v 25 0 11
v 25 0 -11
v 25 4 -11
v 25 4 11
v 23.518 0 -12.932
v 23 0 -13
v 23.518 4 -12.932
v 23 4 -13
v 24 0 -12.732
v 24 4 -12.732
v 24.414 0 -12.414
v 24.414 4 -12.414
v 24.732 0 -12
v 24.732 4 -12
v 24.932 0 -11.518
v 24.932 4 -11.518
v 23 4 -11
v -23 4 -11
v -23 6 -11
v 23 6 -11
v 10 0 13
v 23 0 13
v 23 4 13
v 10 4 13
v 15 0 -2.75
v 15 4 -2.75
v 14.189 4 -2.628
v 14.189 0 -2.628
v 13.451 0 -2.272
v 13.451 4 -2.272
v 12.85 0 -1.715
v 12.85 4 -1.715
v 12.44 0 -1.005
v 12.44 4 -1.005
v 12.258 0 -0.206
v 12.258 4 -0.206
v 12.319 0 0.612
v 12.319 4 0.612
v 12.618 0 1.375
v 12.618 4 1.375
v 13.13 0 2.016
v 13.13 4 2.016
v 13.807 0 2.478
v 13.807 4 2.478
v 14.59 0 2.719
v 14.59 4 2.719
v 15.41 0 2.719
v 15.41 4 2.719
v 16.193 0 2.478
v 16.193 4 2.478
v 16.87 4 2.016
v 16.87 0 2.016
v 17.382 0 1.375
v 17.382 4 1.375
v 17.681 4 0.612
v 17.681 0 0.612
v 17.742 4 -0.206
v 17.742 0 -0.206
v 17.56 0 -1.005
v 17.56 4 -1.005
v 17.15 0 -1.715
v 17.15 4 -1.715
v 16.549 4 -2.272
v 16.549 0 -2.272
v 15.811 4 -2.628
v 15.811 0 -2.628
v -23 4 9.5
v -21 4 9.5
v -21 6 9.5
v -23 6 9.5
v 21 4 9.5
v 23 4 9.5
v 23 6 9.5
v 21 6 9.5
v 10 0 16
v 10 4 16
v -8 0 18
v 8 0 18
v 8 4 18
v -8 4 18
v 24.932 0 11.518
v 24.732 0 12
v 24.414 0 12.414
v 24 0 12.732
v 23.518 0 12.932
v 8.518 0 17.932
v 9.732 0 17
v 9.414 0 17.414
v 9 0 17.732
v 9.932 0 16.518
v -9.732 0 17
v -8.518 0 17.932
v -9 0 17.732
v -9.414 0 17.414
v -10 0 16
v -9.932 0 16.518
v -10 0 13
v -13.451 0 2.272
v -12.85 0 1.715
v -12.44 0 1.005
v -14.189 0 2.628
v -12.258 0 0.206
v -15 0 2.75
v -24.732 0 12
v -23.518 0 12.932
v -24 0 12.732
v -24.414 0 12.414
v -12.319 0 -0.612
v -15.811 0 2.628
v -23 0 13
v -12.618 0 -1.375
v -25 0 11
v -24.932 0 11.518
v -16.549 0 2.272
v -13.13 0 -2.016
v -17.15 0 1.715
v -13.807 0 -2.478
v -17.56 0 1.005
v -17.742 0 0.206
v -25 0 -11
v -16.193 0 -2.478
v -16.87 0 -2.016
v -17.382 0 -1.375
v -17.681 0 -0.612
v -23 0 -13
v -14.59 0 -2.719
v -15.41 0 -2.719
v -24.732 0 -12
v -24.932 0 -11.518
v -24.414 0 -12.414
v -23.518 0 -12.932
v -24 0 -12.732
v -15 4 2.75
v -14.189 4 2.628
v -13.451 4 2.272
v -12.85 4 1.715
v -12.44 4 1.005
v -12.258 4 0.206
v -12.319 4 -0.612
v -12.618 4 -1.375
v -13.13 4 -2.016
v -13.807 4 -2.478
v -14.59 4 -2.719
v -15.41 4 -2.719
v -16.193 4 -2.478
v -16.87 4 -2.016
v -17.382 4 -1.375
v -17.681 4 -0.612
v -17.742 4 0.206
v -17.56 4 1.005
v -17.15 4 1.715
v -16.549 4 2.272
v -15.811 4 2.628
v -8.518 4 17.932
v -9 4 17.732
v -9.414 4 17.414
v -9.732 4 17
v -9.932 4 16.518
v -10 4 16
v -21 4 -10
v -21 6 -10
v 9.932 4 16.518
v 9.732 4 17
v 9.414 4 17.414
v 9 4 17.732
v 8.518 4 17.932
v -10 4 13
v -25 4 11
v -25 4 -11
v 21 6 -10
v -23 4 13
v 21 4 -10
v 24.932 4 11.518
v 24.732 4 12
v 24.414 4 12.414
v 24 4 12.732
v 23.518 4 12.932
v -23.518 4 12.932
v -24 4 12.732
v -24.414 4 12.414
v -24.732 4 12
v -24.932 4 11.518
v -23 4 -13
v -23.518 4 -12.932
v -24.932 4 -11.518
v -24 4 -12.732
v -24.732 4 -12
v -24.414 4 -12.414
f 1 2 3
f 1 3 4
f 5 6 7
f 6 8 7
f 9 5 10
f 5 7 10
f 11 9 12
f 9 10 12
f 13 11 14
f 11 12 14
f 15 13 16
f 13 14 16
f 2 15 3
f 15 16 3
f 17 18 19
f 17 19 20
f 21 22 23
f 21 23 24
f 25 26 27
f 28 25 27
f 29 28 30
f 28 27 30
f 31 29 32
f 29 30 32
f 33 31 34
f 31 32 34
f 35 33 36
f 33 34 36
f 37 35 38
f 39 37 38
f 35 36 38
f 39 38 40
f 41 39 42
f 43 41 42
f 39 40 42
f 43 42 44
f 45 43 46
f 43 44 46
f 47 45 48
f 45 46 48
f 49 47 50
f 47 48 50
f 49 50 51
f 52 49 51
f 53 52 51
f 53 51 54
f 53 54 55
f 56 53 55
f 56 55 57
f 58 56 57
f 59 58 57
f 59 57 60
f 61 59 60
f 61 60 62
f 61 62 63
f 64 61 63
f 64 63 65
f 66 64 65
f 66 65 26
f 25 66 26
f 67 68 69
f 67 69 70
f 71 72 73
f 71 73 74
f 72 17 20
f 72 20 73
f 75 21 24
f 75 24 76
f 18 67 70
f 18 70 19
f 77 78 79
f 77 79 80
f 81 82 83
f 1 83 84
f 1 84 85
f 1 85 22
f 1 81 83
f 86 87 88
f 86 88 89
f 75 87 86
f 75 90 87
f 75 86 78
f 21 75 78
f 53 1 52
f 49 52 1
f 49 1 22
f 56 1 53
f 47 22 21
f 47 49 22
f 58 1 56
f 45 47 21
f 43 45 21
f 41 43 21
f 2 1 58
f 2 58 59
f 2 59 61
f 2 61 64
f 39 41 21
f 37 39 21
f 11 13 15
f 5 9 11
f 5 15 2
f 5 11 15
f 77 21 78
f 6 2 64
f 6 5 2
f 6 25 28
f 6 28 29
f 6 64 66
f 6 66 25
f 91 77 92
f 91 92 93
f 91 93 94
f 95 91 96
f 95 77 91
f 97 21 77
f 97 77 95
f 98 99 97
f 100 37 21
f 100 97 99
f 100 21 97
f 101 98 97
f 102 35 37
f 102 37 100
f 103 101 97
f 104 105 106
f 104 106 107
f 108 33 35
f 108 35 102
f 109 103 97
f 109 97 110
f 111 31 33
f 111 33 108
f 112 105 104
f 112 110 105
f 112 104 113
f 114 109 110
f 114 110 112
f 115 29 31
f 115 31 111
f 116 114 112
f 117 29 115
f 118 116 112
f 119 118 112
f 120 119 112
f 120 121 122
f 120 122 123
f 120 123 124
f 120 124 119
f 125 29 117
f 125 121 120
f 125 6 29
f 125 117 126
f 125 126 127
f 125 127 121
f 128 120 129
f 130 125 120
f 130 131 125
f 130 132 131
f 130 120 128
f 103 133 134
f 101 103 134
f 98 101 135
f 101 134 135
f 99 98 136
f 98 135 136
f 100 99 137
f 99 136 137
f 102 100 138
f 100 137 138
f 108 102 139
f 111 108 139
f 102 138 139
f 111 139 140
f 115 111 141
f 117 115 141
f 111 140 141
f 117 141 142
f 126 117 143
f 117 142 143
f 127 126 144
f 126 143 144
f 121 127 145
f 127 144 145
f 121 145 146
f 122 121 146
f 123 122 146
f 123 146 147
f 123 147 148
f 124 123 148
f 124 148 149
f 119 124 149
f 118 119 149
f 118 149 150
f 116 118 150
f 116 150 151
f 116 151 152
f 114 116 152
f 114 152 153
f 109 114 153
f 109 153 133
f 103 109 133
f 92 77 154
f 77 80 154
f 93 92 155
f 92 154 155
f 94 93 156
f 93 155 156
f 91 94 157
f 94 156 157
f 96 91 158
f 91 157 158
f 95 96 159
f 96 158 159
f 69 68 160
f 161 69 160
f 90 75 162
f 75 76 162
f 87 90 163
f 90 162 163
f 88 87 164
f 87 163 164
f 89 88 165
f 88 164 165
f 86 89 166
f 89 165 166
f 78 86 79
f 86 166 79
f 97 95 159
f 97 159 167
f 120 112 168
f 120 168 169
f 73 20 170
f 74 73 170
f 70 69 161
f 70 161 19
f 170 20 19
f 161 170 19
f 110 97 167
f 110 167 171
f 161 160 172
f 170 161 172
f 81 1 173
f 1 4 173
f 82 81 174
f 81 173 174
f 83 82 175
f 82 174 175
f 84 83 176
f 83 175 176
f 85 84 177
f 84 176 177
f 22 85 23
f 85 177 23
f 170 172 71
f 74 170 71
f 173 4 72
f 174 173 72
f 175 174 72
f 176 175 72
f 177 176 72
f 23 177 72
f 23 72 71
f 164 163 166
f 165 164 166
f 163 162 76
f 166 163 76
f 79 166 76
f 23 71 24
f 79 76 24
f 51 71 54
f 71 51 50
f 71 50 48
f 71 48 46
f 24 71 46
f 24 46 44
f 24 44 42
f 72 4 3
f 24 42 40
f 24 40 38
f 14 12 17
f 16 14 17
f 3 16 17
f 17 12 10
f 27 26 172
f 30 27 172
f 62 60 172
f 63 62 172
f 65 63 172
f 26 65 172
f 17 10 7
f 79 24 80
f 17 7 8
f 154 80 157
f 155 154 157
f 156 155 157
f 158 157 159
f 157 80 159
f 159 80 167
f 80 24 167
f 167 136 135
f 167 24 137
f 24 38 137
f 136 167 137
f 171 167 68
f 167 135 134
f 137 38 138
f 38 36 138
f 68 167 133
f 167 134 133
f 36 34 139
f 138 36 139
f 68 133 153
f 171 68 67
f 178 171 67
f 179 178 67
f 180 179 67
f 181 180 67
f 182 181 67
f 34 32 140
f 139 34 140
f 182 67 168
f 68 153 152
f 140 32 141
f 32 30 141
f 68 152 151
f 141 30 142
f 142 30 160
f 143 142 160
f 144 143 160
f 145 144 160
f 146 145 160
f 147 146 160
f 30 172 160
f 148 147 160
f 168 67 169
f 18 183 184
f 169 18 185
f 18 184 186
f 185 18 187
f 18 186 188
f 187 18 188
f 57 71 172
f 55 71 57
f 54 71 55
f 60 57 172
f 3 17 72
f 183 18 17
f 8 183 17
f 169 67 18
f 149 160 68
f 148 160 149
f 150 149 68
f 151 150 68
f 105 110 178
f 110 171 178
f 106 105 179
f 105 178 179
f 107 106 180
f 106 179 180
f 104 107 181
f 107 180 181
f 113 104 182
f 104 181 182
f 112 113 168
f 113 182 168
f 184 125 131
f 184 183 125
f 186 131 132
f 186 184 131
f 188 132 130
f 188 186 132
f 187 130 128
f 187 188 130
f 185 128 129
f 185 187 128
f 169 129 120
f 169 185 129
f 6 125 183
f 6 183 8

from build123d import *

# Parameters (mm, degrees)
EXTRUDE_1_DEPTH     = 4
FILLET_1_R          = 2
CUT_EXTRUDE_1_REACH = 33.064
SKETCH_3_R          = 2.75
EXTRUDE_2_DEPTH     = 2


with BuildPart() as part:
    # 草图1 → 凸台-拉伸1 (new body)
    with BuildSketch(Plane(origin=(0, 0, 0), x_dir=(1, 0, 0), z_dir=(0, 1, 0))):
        Polygon((-25, 13), (25, 13), (25, -13), (10, -13), (10, -18), (-10, -18), (-10, -13), (-25, -13), align=None)
    extrude(amount=EXTRUDE_1_DEPTH)

    # 圆角1
    fillet_1_edges = [part.edges().sort_by_distance(p)[0] for p in [
        (10, 2, 18),
        (-10, 2, 18),
        (-25, 2, 13),
        (-25, 2, -13),
        (25, 2, -13),
        (25, 2, 13),
    ]]
    fillet(fillet_1_edges, radius=FILLET_1_R)

    # 草图3 → 切除-拉伸1 (cut, up to next)
    with BuildSketch(Plane(origin=(0, 4, 0), x_dir=(1, 0, 0), z_dir=(0, 1, 0)), mode=Mode.PRIVATE) as cut_extrude_1_sk1:
        with Locations(Location((-15, 0, 0), (0, 0, 270))):
            Circle(SKETCH_3_R)
    cut_extrude_1_tool1 = extrude(cut_extrude_1_sk1.sketch, amount=-CUT_EXTRUDE_1_REACH, mode=Mode.PRIVATE) & part.part
    # 草图3 → 切除-拉伸1 (cut, up to next)
    with BuildSketch(Plane(origin=(0, 4, 0), x_dir=(1, 0, 0), z_dir=(0, 1, 0)), mode=Mode.PRIVATE) as cut_extrude_1_sk2:
        with Locations(Location((15, 0, 0), (0, 0, 90))):
            Circle(SKETCH_3_R)
    cut_extrude_1_tool2 = extrude(cut_extrude_1_sk2.sketch, amount=-CUT_EXTRUDE_1_REACH, mode=Mode.PRIVATE) & part.part
    add(cut_extrude_1_tool1.solids().sort_by_distance((-15, 4, 0))[0], mode=Mode.SUBTRACT)
    add(cut_extrude_1_tool2.solids().sort_by_distance((15, 4, 0))[0], mode=Mode.SUBTRACT)

    # 草图4 → 凸台-拉伸2 (add)
    with BuildSketch(Plane(origin=(0, 4, 0), x_dir=(1, 0, 0), z_dir=(0, 1, 0))):
        Polygon((21, -9.5), (21, 9.5), (21, 10), (-8.5, 10), (-20.5, 10), (-21, 10), (-21, 9.5), (-21, -9.5), (-23, -9.5), (-23, 11), (23, 11), (23, -9.5), align=None)
    extrude(amount=EXTRUDE_2_DEPTH)


solid = part.part
